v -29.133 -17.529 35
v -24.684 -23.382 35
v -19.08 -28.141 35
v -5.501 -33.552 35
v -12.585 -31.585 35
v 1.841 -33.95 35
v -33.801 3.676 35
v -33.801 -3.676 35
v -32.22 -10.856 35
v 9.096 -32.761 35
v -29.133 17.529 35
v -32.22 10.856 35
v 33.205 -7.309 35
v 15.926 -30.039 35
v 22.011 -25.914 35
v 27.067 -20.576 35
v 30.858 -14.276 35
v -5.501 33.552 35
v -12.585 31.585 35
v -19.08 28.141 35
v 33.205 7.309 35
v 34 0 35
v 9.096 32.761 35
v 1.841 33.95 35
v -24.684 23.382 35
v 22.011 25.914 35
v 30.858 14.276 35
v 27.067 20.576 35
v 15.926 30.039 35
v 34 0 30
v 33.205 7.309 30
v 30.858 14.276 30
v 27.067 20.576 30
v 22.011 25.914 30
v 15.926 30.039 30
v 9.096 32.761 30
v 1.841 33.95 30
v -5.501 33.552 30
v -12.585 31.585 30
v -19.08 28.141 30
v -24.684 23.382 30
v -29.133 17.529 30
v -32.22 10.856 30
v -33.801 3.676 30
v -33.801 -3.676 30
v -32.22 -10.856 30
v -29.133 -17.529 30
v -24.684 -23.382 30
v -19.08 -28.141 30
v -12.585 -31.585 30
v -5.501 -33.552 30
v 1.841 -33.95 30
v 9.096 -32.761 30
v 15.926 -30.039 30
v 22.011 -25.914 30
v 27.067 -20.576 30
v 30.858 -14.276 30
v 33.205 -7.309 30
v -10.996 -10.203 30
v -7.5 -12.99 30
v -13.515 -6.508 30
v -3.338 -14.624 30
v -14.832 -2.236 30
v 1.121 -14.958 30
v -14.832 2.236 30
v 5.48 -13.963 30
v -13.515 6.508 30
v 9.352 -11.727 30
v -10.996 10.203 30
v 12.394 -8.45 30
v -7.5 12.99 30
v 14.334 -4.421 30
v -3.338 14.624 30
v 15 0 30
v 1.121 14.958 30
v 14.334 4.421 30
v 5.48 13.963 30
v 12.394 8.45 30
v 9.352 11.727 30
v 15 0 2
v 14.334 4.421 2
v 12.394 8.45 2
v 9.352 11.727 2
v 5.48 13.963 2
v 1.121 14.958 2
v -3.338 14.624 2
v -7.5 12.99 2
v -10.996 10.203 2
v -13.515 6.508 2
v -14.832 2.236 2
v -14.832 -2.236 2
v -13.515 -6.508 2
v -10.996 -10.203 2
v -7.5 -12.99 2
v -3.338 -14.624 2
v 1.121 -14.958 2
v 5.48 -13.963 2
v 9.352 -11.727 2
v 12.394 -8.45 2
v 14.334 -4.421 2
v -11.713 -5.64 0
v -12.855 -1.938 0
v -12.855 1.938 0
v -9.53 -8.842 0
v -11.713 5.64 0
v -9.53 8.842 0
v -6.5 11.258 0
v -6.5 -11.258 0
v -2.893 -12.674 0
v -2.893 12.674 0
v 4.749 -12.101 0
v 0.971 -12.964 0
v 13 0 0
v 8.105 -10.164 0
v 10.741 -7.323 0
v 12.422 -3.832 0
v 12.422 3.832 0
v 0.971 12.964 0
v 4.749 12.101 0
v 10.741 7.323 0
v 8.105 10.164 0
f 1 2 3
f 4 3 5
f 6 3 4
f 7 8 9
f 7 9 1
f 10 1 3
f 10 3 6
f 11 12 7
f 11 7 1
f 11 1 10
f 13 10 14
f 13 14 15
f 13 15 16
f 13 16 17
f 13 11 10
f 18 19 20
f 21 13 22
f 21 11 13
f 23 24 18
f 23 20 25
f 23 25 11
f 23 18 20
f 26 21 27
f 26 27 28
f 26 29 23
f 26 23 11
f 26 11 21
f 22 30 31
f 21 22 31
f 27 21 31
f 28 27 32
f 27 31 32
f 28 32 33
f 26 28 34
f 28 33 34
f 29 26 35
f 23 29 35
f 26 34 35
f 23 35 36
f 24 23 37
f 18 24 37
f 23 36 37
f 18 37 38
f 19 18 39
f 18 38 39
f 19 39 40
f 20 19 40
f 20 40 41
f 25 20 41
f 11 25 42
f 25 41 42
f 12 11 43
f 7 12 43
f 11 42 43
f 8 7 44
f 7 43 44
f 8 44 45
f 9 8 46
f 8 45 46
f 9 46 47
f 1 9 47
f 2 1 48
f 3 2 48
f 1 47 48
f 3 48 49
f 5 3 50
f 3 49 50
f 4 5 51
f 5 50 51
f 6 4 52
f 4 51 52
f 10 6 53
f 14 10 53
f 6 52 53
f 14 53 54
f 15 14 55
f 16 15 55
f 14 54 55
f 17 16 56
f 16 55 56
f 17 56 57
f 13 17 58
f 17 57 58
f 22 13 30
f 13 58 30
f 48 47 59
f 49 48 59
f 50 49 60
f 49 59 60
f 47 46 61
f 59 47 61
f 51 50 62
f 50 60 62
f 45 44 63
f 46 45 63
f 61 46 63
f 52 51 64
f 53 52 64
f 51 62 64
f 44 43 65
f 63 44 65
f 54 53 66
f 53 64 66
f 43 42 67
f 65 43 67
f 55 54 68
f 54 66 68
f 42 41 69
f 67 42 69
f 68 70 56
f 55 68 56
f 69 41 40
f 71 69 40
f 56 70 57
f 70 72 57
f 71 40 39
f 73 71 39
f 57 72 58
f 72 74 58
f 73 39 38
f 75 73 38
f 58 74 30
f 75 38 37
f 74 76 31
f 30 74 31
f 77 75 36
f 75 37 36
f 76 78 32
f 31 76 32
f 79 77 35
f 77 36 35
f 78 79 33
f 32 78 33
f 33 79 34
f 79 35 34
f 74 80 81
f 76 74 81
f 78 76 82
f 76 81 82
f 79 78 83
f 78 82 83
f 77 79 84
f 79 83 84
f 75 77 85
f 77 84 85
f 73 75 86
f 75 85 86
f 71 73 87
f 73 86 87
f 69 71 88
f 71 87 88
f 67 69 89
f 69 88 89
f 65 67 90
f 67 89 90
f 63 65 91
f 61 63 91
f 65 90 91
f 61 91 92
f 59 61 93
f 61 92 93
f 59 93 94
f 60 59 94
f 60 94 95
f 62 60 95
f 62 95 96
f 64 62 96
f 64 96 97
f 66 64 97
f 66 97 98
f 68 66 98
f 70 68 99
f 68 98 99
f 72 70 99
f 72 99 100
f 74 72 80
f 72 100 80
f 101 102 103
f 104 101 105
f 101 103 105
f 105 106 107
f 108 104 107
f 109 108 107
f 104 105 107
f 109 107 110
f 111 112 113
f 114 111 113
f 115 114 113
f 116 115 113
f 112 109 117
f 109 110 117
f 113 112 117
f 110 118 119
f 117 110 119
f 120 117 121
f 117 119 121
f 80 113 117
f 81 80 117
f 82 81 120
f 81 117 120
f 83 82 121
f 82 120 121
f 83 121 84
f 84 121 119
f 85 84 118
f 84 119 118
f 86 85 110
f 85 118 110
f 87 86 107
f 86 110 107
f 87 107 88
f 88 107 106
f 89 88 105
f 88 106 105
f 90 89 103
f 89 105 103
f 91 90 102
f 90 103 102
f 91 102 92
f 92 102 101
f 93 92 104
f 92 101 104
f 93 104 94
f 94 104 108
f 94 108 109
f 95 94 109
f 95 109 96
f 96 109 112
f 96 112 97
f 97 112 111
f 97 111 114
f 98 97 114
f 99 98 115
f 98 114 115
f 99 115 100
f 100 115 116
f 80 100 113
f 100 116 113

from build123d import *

# Parameters (mm, degrees)
SKETCH_1_R      = 15
EXTRUDE_1_DEPTH = 30
SKETCH_2_R      = 34
EXTRUDE_2_DEPTH = 5
CHAMFER_1_SIZE  = 2


with BuildPart() as part:
    # 草图1 → 凸台-拉伸1 (new body)
    with BuildSketch(Plane.XY):
        Circle(SKETCH_1_R)
    extrude(amount=EXTRUDE_1_DEPTH)

    # 草图2 → 凸台-拉伸2 (add)
    with BuildSketch(Plane.XY.offset(30)):
        Circle(SKETCH_2_R)
    extrude(amount=EXTRUDE_2_DEPTH)

    # 倒角1
    chamfer_1_edges = [part.edges().sort_by_distance(p)[0] for p in [
        (-15, 0, 0),
    ]]
    chamfer(chamfer_1_edges, length=CHAMFER_1_SIZE)


solid = part.part
